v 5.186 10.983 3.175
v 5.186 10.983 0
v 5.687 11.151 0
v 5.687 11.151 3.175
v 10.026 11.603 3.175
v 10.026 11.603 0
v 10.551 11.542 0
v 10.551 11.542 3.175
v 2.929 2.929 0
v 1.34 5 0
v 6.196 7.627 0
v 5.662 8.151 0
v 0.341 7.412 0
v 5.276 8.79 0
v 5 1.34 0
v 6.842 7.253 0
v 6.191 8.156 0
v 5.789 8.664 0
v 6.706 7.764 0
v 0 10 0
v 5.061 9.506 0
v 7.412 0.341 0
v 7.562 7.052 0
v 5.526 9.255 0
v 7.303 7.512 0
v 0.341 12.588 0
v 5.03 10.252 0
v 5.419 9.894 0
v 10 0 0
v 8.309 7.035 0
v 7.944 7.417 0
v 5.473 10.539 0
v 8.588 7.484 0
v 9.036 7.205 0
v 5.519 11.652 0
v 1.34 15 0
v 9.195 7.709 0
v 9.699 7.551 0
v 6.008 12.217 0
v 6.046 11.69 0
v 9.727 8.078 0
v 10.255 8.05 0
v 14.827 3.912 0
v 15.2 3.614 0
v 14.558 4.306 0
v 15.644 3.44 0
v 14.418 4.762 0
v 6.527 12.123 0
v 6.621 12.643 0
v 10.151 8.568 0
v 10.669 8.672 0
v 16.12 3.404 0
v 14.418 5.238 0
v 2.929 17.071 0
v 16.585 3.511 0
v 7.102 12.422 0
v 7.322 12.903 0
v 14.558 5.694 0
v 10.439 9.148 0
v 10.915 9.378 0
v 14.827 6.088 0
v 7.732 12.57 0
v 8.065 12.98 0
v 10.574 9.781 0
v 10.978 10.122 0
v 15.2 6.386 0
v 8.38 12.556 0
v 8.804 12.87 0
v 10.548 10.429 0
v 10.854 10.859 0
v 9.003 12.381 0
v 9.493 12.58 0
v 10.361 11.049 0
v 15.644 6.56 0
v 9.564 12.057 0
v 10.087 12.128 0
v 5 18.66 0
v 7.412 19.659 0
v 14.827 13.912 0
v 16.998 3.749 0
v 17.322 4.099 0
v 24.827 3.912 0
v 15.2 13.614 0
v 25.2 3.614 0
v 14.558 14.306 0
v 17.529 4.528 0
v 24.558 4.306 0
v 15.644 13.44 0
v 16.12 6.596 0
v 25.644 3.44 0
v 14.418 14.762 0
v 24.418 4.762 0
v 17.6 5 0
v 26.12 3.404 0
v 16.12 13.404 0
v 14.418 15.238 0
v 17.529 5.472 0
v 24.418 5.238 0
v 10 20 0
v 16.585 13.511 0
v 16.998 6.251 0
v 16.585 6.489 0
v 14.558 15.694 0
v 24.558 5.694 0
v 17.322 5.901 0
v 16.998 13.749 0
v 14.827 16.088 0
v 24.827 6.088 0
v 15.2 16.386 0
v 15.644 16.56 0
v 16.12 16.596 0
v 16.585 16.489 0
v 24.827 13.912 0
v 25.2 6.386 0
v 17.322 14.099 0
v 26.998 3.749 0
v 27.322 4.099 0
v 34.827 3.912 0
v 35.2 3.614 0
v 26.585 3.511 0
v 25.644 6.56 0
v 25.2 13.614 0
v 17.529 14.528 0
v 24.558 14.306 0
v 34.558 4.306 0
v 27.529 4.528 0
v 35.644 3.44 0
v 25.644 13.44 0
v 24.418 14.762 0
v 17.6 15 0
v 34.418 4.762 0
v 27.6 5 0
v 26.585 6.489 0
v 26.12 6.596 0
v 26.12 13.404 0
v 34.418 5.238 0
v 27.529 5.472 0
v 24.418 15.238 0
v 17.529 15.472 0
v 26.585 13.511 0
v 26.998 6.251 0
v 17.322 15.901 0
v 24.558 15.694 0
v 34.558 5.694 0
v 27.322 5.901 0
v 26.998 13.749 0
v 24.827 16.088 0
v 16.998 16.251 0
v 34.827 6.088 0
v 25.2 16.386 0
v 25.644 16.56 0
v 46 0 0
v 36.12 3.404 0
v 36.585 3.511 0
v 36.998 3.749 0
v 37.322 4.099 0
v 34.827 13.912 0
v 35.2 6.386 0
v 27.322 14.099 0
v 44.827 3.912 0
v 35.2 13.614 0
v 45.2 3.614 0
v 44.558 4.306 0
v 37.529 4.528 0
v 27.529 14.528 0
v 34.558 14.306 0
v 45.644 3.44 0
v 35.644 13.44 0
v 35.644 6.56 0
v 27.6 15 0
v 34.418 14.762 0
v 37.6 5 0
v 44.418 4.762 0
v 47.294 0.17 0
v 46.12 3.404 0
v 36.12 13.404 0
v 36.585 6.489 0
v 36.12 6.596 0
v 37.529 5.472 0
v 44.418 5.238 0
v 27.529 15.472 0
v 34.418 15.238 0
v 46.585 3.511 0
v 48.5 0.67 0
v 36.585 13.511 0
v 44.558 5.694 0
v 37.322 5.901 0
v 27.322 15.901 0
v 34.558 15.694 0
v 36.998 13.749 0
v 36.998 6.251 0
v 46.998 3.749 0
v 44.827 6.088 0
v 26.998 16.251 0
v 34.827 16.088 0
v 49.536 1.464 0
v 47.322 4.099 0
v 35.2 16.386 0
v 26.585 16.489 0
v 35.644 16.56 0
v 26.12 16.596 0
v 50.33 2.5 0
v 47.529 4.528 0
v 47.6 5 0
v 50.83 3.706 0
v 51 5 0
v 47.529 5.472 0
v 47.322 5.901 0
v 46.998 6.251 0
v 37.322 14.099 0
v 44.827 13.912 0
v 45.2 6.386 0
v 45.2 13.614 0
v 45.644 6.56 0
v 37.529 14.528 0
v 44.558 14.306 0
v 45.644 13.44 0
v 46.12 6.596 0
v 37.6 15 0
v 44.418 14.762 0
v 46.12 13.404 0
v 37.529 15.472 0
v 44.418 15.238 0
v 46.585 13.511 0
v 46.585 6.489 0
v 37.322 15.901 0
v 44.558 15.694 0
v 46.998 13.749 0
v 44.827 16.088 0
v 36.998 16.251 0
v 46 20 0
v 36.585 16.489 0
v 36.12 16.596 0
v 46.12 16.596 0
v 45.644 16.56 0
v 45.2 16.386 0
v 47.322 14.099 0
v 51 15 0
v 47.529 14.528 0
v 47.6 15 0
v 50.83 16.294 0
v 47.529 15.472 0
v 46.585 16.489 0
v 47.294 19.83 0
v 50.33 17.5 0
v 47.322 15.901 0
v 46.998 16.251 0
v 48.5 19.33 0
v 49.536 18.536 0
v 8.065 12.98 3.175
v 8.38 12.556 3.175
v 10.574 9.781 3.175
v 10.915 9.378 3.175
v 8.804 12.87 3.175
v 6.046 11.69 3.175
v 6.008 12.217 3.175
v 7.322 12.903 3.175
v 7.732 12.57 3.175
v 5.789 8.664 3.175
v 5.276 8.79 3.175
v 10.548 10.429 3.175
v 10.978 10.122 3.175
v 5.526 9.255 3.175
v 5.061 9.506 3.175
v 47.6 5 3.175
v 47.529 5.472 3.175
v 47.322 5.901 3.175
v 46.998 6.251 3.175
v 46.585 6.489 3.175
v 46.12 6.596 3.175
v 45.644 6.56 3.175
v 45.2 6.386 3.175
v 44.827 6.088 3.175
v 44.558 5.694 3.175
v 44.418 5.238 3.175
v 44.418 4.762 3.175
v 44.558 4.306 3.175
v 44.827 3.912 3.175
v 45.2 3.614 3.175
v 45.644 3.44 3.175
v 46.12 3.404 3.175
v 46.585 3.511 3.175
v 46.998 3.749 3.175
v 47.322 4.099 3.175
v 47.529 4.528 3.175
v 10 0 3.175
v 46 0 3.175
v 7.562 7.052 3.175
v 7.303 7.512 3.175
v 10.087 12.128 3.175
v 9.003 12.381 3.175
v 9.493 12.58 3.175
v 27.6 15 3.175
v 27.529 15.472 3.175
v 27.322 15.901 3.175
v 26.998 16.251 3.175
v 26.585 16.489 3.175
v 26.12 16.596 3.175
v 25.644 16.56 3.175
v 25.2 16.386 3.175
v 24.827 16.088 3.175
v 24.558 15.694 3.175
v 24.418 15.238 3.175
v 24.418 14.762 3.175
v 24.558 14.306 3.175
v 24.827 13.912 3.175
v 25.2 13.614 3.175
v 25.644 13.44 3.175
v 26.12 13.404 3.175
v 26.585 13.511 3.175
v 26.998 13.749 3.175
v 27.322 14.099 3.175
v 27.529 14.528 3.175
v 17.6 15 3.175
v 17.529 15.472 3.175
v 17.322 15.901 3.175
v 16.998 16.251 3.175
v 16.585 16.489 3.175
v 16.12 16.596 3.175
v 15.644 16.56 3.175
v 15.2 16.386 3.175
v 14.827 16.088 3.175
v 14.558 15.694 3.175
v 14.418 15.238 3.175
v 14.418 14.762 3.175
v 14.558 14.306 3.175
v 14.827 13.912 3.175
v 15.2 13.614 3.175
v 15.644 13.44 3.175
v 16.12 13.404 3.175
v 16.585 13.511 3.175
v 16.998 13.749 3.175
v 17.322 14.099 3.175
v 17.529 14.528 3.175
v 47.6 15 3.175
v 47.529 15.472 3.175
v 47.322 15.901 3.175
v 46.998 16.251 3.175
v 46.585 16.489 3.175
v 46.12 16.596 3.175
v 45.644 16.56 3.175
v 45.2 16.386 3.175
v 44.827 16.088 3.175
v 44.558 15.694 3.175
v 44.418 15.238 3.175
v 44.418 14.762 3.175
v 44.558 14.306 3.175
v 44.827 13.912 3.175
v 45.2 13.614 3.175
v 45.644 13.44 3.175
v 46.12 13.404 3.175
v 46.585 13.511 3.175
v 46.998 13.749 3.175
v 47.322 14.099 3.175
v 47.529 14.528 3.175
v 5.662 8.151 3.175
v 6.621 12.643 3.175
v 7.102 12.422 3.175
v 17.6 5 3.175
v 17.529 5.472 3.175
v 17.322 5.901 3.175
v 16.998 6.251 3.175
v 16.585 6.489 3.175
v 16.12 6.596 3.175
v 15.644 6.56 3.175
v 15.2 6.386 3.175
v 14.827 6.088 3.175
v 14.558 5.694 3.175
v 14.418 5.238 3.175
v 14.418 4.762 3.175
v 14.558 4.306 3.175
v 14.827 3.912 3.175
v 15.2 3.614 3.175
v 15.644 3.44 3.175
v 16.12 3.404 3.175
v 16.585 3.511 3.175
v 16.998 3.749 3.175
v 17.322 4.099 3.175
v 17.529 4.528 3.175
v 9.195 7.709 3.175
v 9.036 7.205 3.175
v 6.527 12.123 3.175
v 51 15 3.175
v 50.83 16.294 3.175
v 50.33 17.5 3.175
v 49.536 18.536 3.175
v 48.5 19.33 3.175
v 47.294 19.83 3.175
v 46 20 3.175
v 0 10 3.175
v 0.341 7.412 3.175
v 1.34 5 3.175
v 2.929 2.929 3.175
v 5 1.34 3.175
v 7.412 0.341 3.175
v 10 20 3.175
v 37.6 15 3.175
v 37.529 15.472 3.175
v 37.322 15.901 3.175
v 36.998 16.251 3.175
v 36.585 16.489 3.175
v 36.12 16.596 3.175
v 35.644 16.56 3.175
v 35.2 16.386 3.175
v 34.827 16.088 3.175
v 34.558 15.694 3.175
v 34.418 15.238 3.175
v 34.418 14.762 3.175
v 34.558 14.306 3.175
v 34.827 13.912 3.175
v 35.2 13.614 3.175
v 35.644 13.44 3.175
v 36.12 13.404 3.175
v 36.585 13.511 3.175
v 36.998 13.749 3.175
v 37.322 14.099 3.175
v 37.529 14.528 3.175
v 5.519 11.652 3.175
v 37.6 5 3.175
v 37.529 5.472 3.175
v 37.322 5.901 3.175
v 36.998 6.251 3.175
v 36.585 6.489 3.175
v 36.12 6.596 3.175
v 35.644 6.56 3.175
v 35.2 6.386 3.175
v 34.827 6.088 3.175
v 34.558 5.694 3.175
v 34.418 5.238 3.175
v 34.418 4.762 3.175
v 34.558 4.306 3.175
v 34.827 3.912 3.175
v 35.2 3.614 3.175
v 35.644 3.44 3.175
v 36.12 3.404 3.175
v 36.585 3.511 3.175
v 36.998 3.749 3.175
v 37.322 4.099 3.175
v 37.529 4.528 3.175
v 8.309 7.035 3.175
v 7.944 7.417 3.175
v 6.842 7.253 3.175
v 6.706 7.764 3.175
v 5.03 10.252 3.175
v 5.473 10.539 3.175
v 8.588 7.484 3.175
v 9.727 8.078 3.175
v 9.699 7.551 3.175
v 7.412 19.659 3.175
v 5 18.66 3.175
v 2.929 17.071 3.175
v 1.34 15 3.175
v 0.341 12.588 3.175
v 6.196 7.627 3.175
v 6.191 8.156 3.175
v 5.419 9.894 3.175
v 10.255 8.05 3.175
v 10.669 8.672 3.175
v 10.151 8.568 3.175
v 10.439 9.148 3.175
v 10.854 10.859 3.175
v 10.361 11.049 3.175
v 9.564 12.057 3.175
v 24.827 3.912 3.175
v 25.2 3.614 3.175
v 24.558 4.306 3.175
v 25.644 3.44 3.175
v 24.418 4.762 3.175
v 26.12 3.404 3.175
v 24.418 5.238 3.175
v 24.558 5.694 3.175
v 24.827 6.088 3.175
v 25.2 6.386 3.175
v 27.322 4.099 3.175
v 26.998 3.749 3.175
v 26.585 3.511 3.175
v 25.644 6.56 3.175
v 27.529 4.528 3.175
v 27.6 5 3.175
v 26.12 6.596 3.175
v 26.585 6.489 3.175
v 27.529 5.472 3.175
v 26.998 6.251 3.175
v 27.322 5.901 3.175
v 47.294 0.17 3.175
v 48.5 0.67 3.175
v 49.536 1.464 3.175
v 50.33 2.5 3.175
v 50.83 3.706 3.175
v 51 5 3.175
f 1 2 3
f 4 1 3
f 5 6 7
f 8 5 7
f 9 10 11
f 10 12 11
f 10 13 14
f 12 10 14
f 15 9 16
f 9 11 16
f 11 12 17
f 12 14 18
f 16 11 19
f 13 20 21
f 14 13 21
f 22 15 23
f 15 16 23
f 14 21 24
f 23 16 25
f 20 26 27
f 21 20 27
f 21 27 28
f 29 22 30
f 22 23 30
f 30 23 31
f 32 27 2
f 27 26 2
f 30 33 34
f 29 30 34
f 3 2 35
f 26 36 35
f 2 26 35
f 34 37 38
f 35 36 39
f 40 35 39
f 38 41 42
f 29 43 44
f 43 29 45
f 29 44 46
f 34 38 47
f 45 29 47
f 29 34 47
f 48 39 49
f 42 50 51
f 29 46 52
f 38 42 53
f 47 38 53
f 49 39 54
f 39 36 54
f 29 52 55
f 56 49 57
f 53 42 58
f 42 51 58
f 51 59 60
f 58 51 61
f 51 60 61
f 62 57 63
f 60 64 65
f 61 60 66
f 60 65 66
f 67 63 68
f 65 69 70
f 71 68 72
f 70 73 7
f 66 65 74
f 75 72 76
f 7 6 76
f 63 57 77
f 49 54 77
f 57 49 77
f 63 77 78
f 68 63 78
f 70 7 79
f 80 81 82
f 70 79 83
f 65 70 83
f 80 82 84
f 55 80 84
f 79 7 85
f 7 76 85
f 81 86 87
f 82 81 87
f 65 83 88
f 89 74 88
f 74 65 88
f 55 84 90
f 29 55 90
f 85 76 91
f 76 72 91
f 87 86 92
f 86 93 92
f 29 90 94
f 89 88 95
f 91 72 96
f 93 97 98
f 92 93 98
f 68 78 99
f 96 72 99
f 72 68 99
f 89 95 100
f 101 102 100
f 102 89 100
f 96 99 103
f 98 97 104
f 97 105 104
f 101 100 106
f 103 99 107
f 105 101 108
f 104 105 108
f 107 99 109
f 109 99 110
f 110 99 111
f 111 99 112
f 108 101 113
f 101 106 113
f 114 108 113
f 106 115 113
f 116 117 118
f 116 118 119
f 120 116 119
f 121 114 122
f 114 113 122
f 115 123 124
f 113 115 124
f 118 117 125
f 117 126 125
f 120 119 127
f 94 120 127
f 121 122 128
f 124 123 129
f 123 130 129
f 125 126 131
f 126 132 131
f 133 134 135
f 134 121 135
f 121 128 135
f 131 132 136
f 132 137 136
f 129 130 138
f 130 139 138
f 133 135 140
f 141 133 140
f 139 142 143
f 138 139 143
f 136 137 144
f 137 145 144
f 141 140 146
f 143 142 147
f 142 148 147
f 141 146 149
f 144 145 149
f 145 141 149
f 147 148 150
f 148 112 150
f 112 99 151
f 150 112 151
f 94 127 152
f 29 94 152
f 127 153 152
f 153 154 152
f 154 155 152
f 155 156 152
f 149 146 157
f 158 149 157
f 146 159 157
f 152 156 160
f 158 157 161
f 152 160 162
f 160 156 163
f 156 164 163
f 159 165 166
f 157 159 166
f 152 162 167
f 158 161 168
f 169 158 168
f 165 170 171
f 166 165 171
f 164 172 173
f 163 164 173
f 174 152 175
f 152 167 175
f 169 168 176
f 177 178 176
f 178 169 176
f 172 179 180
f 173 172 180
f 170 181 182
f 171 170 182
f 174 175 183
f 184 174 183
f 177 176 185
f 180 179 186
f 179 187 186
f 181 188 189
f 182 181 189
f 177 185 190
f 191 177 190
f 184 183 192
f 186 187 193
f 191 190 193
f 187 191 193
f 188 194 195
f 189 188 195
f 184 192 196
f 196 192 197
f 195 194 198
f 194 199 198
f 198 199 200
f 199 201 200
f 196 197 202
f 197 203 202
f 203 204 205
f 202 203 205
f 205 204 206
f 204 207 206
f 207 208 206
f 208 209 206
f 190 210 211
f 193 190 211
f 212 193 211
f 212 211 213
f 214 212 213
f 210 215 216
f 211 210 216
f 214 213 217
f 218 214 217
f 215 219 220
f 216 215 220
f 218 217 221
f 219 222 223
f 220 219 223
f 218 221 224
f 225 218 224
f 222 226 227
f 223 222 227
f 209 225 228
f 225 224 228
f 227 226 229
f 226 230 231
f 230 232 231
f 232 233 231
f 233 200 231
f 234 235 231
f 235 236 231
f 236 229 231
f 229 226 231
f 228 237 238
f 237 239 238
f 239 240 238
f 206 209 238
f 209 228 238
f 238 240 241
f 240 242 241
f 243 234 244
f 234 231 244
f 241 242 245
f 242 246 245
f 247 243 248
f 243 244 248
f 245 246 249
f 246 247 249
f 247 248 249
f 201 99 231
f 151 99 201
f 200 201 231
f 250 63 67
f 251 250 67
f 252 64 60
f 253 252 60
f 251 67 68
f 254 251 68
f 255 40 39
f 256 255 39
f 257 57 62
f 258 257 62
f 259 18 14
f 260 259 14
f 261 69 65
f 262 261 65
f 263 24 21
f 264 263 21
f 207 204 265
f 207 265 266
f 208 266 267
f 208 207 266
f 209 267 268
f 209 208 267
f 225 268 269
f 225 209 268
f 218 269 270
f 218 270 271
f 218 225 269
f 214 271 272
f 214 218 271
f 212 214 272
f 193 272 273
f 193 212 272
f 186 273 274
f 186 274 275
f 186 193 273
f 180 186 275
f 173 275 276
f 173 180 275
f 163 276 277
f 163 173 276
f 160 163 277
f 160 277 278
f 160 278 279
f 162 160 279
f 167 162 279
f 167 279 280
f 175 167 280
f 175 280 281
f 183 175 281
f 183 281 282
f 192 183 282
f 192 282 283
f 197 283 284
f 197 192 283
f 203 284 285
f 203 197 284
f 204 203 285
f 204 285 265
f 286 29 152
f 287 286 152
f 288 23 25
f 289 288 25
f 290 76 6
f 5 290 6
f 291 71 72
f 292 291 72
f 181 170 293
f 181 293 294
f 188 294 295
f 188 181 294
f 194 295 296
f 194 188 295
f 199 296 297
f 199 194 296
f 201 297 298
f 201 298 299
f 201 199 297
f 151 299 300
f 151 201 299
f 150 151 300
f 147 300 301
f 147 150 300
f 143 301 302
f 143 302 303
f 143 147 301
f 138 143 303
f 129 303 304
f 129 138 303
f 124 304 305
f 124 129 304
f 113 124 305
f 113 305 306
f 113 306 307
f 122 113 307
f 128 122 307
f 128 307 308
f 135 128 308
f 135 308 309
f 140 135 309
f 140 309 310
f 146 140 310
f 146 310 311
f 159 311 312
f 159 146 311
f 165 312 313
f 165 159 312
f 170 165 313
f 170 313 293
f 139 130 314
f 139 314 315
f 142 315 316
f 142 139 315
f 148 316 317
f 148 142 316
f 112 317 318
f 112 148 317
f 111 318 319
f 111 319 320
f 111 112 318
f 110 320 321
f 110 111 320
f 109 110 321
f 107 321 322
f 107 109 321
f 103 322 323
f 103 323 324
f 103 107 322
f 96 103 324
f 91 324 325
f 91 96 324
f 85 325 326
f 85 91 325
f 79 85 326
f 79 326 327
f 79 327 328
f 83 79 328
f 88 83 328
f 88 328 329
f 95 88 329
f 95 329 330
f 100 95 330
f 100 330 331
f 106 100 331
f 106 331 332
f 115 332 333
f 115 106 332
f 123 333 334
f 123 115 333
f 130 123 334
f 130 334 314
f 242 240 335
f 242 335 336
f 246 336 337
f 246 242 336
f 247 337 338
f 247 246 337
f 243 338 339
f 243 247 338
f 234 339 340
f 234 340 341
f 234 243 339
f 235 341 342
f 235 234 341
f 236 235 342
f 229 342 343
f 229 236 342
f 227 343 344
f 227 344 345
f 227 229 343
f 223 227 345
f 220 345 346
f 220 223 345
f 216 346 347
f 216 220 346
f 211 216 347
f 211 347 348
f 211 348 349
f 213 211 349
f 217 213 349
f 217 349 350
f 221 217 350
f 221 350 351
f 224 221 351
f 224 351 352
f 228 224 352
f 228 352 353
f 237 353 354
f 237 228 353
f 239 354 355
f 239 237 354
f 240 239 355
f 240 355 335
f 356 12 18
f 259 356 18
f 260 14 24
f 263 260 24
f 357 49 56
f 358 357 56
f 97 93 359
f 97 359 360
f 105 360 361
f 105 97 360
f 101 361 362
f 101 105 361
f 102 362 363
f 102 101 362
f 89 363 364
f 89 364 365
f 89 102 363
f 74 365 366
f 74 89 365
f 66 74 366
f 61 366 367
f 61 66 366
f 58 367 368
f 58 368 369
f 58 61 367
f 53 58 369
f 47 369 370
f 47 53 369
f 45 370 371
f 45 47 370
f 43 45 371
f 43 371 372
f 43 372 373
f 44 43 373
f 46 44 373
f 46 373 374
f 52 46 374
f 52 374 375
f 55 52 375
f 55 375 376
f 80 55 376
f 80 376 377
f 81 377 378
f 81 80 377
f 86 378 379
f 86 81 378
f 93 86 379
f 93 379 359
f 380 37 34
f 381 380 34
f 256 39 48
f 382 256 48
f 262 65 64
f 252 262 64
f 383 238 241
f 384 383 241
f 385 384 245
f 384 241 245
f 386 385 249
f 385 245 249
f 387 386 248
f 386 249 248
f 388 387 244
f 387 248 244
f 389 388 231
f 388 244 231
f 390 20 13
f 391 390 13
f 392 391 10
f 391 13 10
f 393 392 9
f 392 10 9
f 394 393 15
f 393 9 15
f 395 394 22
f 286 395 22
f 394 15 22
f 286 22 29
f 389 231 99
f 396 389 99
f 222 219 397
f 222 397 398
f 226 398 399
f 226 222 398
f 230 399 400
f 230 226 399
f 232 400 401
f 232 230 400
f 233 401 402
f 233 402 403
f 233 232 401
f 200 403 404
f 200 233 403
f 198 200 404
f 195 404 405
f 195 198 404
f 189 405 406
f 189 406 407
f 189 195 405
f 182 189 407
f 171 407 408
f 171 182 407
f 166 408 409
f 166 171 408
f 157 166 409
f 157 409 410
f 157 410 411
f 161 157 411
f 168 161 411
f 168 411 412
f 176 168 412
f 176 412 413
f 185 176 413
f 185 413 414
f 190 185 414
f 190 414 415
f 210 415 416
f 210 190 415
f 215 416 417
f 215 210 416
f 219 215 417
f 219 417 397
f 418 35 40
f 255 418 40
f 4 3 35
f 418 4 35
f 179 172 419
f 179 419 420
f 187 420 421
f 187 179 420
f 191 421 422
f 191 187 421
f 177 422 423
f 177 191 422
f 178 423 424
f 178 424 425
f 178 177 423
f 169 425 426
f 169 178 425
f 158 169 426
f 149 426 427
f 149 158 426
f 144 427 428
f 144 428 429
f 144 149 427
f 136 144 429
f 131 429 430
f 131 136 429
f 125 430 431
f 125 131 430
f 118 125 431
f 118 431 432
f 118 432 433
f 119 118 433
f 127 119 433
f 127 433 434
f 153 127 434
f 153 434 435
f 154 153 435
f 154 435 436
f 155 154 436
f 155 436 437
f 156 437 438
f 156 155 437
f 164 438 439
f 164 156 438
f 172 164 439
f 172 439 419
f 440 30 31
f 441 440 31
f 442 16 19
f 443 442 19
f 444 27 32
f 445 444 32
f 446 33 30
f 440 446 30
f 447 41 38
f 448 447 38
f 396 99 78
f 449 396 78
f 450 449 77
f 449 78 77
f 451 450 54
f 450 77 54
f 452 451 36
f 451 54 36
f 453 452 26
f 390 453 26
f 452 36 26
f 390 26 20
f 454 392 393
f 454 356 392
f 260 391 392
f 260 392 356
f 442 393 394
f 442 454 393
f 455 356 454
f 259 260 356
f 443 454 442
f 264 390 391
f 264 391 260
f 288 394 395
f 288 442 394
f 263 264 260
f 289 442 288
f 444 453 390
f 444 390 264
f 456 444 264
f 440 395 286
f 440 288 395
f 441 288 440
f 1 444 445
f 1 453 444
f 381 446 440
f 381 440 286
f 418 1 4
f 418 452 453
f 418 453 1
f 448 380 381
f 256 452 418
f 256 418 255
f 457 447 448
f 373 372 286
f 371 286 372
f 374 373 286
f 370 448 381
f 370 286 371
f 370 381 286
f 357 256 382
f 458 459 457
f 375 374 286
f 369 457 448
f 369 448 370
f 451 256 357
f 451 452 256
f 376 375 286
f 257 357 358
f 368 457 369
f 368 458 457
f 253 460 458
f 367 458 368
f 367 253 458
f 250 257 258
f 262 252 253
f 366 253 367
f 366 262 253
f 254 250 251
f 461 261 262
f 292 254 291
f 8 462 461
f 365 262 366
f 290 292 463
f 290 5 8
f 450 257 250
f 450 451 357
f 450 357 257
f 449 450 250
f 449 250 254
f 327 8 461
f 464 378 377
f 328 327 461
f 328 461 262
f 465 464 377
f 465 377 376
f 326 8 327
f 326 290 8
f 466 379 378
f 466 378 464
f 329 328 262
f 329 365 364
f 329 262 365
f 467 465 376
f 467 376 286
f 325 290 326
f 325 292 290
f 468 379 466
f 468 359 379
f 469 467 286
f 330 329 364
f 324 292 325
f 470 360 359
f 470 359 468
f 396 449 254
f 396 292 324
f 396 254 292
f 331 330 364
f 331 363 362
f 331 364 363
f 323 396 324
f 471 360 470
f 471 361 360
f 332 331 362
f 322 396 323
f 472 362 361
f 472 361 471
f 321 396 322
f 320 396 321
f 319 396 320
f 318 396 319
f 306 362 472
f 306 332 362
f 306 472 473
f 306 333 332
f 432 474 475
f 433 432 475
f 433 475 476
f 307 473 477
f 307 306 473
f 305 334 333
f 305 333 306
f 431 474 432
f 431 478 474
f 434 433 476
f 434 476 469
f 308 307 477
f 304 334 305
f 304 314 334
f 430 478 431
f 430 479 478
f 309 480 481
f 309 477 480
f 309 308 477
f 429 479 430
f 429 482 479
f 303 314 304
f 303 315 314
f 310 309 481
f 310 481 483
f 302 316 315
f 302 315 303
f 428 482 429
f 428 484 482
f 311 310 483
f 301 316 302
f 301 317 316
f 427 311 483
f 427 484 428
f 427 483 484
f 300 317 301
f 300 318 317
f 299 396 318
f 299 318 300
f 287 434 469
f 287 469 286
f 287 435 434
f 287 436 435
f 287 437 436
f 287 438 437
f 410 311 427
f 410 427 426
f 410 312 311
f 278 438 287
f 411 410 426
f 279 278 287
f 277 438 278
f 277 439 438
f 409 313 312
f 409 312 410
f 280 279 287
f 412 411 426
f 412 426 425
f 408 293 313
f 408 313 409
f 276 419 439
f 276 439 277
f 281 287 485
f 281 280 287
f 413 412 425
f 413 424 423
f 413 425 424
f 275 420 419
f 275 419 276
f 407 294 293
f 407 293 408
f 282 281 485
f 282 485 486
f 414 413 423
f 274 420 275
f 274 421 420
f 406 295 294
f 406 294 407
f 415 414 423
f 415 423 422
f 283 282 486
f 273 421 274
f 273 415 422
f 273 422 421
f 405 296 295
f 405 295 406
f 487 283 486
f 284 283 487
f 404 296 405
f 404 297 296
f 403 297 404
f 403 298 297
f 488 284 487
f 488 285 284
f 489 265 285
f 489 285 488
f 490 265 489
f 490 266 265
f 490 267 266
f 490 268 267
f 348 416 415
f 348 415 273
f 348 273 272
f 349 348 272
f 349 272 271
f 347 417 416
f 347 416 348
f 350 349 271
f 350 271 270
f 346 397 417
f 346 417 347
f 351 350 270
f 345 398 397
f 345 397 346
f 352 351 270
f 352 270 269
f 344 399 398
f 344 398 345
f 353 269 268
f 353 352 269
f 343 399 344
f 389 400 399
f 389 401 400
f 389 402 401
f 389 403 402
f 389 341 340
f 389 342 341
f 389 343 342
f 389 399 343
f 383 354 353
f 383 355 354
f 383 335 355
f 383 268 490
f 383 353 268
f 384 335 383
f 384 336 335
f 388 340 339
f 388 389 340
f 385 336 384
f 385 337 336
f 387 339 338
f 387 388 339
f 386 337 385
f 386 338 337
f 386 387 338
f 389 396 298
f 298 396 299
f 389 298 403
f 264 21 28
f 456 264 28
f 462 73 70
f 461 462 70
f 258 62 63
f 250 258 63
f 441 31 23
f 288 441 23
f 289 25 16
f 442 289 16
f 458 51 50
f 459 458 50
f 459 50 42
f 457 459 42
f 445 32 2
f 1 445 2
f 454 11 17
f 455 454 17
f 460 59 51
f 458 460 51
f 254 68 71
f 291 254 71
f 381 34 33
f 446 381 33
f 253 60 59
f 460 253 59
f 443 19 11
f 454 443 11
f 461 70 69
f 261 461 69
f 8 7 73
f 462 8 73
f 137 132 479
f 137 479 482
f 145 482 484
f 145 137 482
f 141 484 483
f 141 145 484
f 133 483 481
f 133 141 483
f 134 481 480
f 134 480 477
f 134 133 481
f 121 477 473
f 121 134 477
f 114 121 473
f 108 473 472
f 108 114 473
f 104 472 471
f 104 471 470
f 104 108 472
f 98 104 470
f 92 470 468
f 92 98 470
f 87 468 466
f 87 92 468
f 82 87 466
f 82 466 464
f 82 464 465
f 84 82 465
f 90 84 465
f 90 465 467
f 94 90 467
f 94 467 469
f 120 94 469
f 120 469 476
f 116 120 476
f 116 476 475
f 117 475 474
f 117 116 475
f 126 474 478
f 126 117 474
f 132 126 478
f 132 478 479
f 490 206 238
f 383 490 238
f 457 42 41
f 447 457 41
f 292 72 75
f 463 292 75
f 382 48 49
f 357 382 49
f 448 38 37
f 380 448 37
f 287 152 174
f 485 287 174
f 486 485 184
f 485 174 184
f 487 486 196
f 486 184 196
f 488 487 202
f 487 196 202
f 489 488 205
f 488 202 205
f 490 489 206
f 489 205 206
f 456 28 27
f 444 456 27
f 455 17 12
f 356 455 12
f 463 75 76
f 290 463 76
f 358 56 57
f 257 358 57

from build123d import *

# Parameters (mm, degrees)
F0_R     = 1.6
F1_DEPTH = 3.175


with BuildPart() as f1:
    # F0 (on Top) → F1 (new body)
    with BuildSketch(Plane.XY):
        with BuildLine():
            ThreePointArc((0, 10), (2.928932, 2.928932), (10, 0))
            Line((10, 0), (46, 0))
            ThreePointArc((46, 0), (49.535534, 1.464466), (51, 5))
            Line((51, 5), (51, 15))
            ThreePointArc((51, 15), (49.535534, 18.535534), (46, 20))
            Line((46, 20), (10, 20))
            ThreePointArc((10, 20), (2.928932, 17.071068), (0, 10))
        make_face()
        with Locations((16, 5)):
            Circle(F0_R, mode=Mode.SUBTRACT)
        with Locations((26, 5)):
            Circle(F0_R, mode=Mode.SUBTRACT)
        with Locations((36, 5)):
            Circle(F0_R, mode=Mode.SUBTRACT)
        with Locations((46, 5)):
            Circle(F0_R, mode=Mode.SUBTRACT)
        Polygon((5.686873, 11.150841), (5.518811, 11.651718), (6.045746, 11.689937), (6.007527, 12.216873), (6.527413, 12.122848), (6.621438, 12.642733), (7.101608, 12.422372), (7.321969, 12.902541), (7.732252, 12.56969), (8.065104, 12.979972), (8.37972, 12.555544), (8.804147, 12.87016), (9.003328, 12.380825), (9.492663, 12.580005), (9.563894, 12.056509), (10.08739, 12.12774), (10.026194, 11.602976), (10.550958, 11.54178), (10.361181, 11.048721), (10.85424, 10.858945), (10.547807, 10.428572), (10.97818, 10.122139), (10.574344, 9.781494), (10.914989, 9.377658), (10.439126, 9.148145), (10.668639, 8.672282), (10.150649, 8.568322), (10.254609, 8.050331), (9.727038, 8.078456), (9.698914, 7.550885), (9.194912, 7.709328), (9.036469, 7.205326), (8.587704, 7.484131), (8.308899, 7.035366), (7.943569, 7.417015), (7.56192, 7.051686), (7.30298, 7.512198), (6.842467, 7.253258), (6.706187, 7.763699), (6.195746, 7.627419), (6.190689, 8.155715), (5.662393, 8.150658), (5.788877, 8.663614), (5.275921, 8.790097), (5.525998, 9.255483), (5.060612, 9.505559), (5.418569, 9.894132), (5.029996, 10.252089), (5.473341, 10.539434), (5.185996, 10.982779), align=None, mode=Mode.SUBTRACT)
        with Locations((16, 15)):
            Circle(F0_R, mode=Mode.SUBTRACT)
        with Locations((26, 15)):
            Circle(F0_R, mode=Mode.SUBTRACT)
        with Locations((36, 15)):
            Circle(F0_R, mode=Mode.SUBTRACT)
        with Locations((46, 15)):
            Circle(F0_R, mode=Mode.SUBTRACT)
    extrude(amount=F1_DEPTH)


solid = f1.part
